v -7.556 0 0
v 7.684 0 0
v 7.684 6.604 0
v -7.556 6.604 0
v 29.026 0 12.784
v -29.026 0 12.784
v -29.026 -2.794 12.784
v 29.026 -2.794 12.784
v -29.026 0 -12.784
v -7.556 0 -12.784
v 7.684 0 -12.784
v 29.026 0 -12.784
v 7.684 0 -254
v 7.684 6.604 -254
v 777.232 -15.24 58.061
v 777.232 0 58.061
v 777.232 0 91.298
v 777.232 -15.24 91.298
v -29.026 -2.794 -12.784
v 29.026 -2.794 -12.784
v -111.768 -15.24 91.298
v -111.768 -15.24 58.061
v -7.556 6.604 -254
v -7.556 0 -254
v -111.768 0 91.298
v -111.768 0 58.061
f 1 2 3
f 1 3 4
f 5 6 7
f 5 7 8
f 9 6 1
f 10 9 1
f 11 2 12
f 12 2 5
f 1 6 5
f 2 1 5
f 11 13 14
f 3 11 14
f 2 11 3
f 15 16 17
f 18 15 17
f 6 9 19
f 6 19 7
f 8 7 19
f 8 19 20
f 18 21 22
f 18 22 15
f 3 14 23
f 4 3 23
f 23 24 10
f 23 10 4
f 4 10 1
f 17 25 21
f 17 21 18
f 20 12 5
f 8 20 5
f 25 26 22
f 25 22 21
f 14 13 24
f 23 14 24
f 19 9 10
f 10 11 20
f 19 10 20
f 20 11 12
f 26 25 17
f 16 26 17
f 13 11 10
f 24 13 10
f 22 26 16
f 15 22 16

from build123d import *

# Parameters (mm, degrees)
F0_W     = 58.052364
F0_H     = 25.567106
F1_DEPTH = 2.794
F2_W     = 15.24
F2_H     = 254
F3_DEPTH = 6.604
F4_W     = 889
F4_H     = 33.237238
F5_DEPTH = 15.24


with BuildPart() as f1:
    # F0 (on Front) → F1 (new body)
    with BuildSketch(Plane.XZ):
        Rectangle(F0_W, F0_H)
    extrude(amount=F1_DEPTH)

    # F2 (on face) → F3 (join)
    with BuildSketch(Plane(origin=(0, 0, 0), x_dir=(-1, 0, 0), z_dir=(0, 1, 0))):
        with Locations((-0.063901, -127)):
            Rectangle(F2_W, F2_H)
    extrude(amount=F3_DEPTH)


with BuildPart() as f5:
    # F4 (on Front) → F5 (new body)
    with BuildSketch(Plane.XZ):
        with Locations((332.731643, 74.67941)):
            Rectangle(F4_W, F4_H)
    extrude(amount=F5_DEPTH)


solid = Compound([f1.part, f5.part])
